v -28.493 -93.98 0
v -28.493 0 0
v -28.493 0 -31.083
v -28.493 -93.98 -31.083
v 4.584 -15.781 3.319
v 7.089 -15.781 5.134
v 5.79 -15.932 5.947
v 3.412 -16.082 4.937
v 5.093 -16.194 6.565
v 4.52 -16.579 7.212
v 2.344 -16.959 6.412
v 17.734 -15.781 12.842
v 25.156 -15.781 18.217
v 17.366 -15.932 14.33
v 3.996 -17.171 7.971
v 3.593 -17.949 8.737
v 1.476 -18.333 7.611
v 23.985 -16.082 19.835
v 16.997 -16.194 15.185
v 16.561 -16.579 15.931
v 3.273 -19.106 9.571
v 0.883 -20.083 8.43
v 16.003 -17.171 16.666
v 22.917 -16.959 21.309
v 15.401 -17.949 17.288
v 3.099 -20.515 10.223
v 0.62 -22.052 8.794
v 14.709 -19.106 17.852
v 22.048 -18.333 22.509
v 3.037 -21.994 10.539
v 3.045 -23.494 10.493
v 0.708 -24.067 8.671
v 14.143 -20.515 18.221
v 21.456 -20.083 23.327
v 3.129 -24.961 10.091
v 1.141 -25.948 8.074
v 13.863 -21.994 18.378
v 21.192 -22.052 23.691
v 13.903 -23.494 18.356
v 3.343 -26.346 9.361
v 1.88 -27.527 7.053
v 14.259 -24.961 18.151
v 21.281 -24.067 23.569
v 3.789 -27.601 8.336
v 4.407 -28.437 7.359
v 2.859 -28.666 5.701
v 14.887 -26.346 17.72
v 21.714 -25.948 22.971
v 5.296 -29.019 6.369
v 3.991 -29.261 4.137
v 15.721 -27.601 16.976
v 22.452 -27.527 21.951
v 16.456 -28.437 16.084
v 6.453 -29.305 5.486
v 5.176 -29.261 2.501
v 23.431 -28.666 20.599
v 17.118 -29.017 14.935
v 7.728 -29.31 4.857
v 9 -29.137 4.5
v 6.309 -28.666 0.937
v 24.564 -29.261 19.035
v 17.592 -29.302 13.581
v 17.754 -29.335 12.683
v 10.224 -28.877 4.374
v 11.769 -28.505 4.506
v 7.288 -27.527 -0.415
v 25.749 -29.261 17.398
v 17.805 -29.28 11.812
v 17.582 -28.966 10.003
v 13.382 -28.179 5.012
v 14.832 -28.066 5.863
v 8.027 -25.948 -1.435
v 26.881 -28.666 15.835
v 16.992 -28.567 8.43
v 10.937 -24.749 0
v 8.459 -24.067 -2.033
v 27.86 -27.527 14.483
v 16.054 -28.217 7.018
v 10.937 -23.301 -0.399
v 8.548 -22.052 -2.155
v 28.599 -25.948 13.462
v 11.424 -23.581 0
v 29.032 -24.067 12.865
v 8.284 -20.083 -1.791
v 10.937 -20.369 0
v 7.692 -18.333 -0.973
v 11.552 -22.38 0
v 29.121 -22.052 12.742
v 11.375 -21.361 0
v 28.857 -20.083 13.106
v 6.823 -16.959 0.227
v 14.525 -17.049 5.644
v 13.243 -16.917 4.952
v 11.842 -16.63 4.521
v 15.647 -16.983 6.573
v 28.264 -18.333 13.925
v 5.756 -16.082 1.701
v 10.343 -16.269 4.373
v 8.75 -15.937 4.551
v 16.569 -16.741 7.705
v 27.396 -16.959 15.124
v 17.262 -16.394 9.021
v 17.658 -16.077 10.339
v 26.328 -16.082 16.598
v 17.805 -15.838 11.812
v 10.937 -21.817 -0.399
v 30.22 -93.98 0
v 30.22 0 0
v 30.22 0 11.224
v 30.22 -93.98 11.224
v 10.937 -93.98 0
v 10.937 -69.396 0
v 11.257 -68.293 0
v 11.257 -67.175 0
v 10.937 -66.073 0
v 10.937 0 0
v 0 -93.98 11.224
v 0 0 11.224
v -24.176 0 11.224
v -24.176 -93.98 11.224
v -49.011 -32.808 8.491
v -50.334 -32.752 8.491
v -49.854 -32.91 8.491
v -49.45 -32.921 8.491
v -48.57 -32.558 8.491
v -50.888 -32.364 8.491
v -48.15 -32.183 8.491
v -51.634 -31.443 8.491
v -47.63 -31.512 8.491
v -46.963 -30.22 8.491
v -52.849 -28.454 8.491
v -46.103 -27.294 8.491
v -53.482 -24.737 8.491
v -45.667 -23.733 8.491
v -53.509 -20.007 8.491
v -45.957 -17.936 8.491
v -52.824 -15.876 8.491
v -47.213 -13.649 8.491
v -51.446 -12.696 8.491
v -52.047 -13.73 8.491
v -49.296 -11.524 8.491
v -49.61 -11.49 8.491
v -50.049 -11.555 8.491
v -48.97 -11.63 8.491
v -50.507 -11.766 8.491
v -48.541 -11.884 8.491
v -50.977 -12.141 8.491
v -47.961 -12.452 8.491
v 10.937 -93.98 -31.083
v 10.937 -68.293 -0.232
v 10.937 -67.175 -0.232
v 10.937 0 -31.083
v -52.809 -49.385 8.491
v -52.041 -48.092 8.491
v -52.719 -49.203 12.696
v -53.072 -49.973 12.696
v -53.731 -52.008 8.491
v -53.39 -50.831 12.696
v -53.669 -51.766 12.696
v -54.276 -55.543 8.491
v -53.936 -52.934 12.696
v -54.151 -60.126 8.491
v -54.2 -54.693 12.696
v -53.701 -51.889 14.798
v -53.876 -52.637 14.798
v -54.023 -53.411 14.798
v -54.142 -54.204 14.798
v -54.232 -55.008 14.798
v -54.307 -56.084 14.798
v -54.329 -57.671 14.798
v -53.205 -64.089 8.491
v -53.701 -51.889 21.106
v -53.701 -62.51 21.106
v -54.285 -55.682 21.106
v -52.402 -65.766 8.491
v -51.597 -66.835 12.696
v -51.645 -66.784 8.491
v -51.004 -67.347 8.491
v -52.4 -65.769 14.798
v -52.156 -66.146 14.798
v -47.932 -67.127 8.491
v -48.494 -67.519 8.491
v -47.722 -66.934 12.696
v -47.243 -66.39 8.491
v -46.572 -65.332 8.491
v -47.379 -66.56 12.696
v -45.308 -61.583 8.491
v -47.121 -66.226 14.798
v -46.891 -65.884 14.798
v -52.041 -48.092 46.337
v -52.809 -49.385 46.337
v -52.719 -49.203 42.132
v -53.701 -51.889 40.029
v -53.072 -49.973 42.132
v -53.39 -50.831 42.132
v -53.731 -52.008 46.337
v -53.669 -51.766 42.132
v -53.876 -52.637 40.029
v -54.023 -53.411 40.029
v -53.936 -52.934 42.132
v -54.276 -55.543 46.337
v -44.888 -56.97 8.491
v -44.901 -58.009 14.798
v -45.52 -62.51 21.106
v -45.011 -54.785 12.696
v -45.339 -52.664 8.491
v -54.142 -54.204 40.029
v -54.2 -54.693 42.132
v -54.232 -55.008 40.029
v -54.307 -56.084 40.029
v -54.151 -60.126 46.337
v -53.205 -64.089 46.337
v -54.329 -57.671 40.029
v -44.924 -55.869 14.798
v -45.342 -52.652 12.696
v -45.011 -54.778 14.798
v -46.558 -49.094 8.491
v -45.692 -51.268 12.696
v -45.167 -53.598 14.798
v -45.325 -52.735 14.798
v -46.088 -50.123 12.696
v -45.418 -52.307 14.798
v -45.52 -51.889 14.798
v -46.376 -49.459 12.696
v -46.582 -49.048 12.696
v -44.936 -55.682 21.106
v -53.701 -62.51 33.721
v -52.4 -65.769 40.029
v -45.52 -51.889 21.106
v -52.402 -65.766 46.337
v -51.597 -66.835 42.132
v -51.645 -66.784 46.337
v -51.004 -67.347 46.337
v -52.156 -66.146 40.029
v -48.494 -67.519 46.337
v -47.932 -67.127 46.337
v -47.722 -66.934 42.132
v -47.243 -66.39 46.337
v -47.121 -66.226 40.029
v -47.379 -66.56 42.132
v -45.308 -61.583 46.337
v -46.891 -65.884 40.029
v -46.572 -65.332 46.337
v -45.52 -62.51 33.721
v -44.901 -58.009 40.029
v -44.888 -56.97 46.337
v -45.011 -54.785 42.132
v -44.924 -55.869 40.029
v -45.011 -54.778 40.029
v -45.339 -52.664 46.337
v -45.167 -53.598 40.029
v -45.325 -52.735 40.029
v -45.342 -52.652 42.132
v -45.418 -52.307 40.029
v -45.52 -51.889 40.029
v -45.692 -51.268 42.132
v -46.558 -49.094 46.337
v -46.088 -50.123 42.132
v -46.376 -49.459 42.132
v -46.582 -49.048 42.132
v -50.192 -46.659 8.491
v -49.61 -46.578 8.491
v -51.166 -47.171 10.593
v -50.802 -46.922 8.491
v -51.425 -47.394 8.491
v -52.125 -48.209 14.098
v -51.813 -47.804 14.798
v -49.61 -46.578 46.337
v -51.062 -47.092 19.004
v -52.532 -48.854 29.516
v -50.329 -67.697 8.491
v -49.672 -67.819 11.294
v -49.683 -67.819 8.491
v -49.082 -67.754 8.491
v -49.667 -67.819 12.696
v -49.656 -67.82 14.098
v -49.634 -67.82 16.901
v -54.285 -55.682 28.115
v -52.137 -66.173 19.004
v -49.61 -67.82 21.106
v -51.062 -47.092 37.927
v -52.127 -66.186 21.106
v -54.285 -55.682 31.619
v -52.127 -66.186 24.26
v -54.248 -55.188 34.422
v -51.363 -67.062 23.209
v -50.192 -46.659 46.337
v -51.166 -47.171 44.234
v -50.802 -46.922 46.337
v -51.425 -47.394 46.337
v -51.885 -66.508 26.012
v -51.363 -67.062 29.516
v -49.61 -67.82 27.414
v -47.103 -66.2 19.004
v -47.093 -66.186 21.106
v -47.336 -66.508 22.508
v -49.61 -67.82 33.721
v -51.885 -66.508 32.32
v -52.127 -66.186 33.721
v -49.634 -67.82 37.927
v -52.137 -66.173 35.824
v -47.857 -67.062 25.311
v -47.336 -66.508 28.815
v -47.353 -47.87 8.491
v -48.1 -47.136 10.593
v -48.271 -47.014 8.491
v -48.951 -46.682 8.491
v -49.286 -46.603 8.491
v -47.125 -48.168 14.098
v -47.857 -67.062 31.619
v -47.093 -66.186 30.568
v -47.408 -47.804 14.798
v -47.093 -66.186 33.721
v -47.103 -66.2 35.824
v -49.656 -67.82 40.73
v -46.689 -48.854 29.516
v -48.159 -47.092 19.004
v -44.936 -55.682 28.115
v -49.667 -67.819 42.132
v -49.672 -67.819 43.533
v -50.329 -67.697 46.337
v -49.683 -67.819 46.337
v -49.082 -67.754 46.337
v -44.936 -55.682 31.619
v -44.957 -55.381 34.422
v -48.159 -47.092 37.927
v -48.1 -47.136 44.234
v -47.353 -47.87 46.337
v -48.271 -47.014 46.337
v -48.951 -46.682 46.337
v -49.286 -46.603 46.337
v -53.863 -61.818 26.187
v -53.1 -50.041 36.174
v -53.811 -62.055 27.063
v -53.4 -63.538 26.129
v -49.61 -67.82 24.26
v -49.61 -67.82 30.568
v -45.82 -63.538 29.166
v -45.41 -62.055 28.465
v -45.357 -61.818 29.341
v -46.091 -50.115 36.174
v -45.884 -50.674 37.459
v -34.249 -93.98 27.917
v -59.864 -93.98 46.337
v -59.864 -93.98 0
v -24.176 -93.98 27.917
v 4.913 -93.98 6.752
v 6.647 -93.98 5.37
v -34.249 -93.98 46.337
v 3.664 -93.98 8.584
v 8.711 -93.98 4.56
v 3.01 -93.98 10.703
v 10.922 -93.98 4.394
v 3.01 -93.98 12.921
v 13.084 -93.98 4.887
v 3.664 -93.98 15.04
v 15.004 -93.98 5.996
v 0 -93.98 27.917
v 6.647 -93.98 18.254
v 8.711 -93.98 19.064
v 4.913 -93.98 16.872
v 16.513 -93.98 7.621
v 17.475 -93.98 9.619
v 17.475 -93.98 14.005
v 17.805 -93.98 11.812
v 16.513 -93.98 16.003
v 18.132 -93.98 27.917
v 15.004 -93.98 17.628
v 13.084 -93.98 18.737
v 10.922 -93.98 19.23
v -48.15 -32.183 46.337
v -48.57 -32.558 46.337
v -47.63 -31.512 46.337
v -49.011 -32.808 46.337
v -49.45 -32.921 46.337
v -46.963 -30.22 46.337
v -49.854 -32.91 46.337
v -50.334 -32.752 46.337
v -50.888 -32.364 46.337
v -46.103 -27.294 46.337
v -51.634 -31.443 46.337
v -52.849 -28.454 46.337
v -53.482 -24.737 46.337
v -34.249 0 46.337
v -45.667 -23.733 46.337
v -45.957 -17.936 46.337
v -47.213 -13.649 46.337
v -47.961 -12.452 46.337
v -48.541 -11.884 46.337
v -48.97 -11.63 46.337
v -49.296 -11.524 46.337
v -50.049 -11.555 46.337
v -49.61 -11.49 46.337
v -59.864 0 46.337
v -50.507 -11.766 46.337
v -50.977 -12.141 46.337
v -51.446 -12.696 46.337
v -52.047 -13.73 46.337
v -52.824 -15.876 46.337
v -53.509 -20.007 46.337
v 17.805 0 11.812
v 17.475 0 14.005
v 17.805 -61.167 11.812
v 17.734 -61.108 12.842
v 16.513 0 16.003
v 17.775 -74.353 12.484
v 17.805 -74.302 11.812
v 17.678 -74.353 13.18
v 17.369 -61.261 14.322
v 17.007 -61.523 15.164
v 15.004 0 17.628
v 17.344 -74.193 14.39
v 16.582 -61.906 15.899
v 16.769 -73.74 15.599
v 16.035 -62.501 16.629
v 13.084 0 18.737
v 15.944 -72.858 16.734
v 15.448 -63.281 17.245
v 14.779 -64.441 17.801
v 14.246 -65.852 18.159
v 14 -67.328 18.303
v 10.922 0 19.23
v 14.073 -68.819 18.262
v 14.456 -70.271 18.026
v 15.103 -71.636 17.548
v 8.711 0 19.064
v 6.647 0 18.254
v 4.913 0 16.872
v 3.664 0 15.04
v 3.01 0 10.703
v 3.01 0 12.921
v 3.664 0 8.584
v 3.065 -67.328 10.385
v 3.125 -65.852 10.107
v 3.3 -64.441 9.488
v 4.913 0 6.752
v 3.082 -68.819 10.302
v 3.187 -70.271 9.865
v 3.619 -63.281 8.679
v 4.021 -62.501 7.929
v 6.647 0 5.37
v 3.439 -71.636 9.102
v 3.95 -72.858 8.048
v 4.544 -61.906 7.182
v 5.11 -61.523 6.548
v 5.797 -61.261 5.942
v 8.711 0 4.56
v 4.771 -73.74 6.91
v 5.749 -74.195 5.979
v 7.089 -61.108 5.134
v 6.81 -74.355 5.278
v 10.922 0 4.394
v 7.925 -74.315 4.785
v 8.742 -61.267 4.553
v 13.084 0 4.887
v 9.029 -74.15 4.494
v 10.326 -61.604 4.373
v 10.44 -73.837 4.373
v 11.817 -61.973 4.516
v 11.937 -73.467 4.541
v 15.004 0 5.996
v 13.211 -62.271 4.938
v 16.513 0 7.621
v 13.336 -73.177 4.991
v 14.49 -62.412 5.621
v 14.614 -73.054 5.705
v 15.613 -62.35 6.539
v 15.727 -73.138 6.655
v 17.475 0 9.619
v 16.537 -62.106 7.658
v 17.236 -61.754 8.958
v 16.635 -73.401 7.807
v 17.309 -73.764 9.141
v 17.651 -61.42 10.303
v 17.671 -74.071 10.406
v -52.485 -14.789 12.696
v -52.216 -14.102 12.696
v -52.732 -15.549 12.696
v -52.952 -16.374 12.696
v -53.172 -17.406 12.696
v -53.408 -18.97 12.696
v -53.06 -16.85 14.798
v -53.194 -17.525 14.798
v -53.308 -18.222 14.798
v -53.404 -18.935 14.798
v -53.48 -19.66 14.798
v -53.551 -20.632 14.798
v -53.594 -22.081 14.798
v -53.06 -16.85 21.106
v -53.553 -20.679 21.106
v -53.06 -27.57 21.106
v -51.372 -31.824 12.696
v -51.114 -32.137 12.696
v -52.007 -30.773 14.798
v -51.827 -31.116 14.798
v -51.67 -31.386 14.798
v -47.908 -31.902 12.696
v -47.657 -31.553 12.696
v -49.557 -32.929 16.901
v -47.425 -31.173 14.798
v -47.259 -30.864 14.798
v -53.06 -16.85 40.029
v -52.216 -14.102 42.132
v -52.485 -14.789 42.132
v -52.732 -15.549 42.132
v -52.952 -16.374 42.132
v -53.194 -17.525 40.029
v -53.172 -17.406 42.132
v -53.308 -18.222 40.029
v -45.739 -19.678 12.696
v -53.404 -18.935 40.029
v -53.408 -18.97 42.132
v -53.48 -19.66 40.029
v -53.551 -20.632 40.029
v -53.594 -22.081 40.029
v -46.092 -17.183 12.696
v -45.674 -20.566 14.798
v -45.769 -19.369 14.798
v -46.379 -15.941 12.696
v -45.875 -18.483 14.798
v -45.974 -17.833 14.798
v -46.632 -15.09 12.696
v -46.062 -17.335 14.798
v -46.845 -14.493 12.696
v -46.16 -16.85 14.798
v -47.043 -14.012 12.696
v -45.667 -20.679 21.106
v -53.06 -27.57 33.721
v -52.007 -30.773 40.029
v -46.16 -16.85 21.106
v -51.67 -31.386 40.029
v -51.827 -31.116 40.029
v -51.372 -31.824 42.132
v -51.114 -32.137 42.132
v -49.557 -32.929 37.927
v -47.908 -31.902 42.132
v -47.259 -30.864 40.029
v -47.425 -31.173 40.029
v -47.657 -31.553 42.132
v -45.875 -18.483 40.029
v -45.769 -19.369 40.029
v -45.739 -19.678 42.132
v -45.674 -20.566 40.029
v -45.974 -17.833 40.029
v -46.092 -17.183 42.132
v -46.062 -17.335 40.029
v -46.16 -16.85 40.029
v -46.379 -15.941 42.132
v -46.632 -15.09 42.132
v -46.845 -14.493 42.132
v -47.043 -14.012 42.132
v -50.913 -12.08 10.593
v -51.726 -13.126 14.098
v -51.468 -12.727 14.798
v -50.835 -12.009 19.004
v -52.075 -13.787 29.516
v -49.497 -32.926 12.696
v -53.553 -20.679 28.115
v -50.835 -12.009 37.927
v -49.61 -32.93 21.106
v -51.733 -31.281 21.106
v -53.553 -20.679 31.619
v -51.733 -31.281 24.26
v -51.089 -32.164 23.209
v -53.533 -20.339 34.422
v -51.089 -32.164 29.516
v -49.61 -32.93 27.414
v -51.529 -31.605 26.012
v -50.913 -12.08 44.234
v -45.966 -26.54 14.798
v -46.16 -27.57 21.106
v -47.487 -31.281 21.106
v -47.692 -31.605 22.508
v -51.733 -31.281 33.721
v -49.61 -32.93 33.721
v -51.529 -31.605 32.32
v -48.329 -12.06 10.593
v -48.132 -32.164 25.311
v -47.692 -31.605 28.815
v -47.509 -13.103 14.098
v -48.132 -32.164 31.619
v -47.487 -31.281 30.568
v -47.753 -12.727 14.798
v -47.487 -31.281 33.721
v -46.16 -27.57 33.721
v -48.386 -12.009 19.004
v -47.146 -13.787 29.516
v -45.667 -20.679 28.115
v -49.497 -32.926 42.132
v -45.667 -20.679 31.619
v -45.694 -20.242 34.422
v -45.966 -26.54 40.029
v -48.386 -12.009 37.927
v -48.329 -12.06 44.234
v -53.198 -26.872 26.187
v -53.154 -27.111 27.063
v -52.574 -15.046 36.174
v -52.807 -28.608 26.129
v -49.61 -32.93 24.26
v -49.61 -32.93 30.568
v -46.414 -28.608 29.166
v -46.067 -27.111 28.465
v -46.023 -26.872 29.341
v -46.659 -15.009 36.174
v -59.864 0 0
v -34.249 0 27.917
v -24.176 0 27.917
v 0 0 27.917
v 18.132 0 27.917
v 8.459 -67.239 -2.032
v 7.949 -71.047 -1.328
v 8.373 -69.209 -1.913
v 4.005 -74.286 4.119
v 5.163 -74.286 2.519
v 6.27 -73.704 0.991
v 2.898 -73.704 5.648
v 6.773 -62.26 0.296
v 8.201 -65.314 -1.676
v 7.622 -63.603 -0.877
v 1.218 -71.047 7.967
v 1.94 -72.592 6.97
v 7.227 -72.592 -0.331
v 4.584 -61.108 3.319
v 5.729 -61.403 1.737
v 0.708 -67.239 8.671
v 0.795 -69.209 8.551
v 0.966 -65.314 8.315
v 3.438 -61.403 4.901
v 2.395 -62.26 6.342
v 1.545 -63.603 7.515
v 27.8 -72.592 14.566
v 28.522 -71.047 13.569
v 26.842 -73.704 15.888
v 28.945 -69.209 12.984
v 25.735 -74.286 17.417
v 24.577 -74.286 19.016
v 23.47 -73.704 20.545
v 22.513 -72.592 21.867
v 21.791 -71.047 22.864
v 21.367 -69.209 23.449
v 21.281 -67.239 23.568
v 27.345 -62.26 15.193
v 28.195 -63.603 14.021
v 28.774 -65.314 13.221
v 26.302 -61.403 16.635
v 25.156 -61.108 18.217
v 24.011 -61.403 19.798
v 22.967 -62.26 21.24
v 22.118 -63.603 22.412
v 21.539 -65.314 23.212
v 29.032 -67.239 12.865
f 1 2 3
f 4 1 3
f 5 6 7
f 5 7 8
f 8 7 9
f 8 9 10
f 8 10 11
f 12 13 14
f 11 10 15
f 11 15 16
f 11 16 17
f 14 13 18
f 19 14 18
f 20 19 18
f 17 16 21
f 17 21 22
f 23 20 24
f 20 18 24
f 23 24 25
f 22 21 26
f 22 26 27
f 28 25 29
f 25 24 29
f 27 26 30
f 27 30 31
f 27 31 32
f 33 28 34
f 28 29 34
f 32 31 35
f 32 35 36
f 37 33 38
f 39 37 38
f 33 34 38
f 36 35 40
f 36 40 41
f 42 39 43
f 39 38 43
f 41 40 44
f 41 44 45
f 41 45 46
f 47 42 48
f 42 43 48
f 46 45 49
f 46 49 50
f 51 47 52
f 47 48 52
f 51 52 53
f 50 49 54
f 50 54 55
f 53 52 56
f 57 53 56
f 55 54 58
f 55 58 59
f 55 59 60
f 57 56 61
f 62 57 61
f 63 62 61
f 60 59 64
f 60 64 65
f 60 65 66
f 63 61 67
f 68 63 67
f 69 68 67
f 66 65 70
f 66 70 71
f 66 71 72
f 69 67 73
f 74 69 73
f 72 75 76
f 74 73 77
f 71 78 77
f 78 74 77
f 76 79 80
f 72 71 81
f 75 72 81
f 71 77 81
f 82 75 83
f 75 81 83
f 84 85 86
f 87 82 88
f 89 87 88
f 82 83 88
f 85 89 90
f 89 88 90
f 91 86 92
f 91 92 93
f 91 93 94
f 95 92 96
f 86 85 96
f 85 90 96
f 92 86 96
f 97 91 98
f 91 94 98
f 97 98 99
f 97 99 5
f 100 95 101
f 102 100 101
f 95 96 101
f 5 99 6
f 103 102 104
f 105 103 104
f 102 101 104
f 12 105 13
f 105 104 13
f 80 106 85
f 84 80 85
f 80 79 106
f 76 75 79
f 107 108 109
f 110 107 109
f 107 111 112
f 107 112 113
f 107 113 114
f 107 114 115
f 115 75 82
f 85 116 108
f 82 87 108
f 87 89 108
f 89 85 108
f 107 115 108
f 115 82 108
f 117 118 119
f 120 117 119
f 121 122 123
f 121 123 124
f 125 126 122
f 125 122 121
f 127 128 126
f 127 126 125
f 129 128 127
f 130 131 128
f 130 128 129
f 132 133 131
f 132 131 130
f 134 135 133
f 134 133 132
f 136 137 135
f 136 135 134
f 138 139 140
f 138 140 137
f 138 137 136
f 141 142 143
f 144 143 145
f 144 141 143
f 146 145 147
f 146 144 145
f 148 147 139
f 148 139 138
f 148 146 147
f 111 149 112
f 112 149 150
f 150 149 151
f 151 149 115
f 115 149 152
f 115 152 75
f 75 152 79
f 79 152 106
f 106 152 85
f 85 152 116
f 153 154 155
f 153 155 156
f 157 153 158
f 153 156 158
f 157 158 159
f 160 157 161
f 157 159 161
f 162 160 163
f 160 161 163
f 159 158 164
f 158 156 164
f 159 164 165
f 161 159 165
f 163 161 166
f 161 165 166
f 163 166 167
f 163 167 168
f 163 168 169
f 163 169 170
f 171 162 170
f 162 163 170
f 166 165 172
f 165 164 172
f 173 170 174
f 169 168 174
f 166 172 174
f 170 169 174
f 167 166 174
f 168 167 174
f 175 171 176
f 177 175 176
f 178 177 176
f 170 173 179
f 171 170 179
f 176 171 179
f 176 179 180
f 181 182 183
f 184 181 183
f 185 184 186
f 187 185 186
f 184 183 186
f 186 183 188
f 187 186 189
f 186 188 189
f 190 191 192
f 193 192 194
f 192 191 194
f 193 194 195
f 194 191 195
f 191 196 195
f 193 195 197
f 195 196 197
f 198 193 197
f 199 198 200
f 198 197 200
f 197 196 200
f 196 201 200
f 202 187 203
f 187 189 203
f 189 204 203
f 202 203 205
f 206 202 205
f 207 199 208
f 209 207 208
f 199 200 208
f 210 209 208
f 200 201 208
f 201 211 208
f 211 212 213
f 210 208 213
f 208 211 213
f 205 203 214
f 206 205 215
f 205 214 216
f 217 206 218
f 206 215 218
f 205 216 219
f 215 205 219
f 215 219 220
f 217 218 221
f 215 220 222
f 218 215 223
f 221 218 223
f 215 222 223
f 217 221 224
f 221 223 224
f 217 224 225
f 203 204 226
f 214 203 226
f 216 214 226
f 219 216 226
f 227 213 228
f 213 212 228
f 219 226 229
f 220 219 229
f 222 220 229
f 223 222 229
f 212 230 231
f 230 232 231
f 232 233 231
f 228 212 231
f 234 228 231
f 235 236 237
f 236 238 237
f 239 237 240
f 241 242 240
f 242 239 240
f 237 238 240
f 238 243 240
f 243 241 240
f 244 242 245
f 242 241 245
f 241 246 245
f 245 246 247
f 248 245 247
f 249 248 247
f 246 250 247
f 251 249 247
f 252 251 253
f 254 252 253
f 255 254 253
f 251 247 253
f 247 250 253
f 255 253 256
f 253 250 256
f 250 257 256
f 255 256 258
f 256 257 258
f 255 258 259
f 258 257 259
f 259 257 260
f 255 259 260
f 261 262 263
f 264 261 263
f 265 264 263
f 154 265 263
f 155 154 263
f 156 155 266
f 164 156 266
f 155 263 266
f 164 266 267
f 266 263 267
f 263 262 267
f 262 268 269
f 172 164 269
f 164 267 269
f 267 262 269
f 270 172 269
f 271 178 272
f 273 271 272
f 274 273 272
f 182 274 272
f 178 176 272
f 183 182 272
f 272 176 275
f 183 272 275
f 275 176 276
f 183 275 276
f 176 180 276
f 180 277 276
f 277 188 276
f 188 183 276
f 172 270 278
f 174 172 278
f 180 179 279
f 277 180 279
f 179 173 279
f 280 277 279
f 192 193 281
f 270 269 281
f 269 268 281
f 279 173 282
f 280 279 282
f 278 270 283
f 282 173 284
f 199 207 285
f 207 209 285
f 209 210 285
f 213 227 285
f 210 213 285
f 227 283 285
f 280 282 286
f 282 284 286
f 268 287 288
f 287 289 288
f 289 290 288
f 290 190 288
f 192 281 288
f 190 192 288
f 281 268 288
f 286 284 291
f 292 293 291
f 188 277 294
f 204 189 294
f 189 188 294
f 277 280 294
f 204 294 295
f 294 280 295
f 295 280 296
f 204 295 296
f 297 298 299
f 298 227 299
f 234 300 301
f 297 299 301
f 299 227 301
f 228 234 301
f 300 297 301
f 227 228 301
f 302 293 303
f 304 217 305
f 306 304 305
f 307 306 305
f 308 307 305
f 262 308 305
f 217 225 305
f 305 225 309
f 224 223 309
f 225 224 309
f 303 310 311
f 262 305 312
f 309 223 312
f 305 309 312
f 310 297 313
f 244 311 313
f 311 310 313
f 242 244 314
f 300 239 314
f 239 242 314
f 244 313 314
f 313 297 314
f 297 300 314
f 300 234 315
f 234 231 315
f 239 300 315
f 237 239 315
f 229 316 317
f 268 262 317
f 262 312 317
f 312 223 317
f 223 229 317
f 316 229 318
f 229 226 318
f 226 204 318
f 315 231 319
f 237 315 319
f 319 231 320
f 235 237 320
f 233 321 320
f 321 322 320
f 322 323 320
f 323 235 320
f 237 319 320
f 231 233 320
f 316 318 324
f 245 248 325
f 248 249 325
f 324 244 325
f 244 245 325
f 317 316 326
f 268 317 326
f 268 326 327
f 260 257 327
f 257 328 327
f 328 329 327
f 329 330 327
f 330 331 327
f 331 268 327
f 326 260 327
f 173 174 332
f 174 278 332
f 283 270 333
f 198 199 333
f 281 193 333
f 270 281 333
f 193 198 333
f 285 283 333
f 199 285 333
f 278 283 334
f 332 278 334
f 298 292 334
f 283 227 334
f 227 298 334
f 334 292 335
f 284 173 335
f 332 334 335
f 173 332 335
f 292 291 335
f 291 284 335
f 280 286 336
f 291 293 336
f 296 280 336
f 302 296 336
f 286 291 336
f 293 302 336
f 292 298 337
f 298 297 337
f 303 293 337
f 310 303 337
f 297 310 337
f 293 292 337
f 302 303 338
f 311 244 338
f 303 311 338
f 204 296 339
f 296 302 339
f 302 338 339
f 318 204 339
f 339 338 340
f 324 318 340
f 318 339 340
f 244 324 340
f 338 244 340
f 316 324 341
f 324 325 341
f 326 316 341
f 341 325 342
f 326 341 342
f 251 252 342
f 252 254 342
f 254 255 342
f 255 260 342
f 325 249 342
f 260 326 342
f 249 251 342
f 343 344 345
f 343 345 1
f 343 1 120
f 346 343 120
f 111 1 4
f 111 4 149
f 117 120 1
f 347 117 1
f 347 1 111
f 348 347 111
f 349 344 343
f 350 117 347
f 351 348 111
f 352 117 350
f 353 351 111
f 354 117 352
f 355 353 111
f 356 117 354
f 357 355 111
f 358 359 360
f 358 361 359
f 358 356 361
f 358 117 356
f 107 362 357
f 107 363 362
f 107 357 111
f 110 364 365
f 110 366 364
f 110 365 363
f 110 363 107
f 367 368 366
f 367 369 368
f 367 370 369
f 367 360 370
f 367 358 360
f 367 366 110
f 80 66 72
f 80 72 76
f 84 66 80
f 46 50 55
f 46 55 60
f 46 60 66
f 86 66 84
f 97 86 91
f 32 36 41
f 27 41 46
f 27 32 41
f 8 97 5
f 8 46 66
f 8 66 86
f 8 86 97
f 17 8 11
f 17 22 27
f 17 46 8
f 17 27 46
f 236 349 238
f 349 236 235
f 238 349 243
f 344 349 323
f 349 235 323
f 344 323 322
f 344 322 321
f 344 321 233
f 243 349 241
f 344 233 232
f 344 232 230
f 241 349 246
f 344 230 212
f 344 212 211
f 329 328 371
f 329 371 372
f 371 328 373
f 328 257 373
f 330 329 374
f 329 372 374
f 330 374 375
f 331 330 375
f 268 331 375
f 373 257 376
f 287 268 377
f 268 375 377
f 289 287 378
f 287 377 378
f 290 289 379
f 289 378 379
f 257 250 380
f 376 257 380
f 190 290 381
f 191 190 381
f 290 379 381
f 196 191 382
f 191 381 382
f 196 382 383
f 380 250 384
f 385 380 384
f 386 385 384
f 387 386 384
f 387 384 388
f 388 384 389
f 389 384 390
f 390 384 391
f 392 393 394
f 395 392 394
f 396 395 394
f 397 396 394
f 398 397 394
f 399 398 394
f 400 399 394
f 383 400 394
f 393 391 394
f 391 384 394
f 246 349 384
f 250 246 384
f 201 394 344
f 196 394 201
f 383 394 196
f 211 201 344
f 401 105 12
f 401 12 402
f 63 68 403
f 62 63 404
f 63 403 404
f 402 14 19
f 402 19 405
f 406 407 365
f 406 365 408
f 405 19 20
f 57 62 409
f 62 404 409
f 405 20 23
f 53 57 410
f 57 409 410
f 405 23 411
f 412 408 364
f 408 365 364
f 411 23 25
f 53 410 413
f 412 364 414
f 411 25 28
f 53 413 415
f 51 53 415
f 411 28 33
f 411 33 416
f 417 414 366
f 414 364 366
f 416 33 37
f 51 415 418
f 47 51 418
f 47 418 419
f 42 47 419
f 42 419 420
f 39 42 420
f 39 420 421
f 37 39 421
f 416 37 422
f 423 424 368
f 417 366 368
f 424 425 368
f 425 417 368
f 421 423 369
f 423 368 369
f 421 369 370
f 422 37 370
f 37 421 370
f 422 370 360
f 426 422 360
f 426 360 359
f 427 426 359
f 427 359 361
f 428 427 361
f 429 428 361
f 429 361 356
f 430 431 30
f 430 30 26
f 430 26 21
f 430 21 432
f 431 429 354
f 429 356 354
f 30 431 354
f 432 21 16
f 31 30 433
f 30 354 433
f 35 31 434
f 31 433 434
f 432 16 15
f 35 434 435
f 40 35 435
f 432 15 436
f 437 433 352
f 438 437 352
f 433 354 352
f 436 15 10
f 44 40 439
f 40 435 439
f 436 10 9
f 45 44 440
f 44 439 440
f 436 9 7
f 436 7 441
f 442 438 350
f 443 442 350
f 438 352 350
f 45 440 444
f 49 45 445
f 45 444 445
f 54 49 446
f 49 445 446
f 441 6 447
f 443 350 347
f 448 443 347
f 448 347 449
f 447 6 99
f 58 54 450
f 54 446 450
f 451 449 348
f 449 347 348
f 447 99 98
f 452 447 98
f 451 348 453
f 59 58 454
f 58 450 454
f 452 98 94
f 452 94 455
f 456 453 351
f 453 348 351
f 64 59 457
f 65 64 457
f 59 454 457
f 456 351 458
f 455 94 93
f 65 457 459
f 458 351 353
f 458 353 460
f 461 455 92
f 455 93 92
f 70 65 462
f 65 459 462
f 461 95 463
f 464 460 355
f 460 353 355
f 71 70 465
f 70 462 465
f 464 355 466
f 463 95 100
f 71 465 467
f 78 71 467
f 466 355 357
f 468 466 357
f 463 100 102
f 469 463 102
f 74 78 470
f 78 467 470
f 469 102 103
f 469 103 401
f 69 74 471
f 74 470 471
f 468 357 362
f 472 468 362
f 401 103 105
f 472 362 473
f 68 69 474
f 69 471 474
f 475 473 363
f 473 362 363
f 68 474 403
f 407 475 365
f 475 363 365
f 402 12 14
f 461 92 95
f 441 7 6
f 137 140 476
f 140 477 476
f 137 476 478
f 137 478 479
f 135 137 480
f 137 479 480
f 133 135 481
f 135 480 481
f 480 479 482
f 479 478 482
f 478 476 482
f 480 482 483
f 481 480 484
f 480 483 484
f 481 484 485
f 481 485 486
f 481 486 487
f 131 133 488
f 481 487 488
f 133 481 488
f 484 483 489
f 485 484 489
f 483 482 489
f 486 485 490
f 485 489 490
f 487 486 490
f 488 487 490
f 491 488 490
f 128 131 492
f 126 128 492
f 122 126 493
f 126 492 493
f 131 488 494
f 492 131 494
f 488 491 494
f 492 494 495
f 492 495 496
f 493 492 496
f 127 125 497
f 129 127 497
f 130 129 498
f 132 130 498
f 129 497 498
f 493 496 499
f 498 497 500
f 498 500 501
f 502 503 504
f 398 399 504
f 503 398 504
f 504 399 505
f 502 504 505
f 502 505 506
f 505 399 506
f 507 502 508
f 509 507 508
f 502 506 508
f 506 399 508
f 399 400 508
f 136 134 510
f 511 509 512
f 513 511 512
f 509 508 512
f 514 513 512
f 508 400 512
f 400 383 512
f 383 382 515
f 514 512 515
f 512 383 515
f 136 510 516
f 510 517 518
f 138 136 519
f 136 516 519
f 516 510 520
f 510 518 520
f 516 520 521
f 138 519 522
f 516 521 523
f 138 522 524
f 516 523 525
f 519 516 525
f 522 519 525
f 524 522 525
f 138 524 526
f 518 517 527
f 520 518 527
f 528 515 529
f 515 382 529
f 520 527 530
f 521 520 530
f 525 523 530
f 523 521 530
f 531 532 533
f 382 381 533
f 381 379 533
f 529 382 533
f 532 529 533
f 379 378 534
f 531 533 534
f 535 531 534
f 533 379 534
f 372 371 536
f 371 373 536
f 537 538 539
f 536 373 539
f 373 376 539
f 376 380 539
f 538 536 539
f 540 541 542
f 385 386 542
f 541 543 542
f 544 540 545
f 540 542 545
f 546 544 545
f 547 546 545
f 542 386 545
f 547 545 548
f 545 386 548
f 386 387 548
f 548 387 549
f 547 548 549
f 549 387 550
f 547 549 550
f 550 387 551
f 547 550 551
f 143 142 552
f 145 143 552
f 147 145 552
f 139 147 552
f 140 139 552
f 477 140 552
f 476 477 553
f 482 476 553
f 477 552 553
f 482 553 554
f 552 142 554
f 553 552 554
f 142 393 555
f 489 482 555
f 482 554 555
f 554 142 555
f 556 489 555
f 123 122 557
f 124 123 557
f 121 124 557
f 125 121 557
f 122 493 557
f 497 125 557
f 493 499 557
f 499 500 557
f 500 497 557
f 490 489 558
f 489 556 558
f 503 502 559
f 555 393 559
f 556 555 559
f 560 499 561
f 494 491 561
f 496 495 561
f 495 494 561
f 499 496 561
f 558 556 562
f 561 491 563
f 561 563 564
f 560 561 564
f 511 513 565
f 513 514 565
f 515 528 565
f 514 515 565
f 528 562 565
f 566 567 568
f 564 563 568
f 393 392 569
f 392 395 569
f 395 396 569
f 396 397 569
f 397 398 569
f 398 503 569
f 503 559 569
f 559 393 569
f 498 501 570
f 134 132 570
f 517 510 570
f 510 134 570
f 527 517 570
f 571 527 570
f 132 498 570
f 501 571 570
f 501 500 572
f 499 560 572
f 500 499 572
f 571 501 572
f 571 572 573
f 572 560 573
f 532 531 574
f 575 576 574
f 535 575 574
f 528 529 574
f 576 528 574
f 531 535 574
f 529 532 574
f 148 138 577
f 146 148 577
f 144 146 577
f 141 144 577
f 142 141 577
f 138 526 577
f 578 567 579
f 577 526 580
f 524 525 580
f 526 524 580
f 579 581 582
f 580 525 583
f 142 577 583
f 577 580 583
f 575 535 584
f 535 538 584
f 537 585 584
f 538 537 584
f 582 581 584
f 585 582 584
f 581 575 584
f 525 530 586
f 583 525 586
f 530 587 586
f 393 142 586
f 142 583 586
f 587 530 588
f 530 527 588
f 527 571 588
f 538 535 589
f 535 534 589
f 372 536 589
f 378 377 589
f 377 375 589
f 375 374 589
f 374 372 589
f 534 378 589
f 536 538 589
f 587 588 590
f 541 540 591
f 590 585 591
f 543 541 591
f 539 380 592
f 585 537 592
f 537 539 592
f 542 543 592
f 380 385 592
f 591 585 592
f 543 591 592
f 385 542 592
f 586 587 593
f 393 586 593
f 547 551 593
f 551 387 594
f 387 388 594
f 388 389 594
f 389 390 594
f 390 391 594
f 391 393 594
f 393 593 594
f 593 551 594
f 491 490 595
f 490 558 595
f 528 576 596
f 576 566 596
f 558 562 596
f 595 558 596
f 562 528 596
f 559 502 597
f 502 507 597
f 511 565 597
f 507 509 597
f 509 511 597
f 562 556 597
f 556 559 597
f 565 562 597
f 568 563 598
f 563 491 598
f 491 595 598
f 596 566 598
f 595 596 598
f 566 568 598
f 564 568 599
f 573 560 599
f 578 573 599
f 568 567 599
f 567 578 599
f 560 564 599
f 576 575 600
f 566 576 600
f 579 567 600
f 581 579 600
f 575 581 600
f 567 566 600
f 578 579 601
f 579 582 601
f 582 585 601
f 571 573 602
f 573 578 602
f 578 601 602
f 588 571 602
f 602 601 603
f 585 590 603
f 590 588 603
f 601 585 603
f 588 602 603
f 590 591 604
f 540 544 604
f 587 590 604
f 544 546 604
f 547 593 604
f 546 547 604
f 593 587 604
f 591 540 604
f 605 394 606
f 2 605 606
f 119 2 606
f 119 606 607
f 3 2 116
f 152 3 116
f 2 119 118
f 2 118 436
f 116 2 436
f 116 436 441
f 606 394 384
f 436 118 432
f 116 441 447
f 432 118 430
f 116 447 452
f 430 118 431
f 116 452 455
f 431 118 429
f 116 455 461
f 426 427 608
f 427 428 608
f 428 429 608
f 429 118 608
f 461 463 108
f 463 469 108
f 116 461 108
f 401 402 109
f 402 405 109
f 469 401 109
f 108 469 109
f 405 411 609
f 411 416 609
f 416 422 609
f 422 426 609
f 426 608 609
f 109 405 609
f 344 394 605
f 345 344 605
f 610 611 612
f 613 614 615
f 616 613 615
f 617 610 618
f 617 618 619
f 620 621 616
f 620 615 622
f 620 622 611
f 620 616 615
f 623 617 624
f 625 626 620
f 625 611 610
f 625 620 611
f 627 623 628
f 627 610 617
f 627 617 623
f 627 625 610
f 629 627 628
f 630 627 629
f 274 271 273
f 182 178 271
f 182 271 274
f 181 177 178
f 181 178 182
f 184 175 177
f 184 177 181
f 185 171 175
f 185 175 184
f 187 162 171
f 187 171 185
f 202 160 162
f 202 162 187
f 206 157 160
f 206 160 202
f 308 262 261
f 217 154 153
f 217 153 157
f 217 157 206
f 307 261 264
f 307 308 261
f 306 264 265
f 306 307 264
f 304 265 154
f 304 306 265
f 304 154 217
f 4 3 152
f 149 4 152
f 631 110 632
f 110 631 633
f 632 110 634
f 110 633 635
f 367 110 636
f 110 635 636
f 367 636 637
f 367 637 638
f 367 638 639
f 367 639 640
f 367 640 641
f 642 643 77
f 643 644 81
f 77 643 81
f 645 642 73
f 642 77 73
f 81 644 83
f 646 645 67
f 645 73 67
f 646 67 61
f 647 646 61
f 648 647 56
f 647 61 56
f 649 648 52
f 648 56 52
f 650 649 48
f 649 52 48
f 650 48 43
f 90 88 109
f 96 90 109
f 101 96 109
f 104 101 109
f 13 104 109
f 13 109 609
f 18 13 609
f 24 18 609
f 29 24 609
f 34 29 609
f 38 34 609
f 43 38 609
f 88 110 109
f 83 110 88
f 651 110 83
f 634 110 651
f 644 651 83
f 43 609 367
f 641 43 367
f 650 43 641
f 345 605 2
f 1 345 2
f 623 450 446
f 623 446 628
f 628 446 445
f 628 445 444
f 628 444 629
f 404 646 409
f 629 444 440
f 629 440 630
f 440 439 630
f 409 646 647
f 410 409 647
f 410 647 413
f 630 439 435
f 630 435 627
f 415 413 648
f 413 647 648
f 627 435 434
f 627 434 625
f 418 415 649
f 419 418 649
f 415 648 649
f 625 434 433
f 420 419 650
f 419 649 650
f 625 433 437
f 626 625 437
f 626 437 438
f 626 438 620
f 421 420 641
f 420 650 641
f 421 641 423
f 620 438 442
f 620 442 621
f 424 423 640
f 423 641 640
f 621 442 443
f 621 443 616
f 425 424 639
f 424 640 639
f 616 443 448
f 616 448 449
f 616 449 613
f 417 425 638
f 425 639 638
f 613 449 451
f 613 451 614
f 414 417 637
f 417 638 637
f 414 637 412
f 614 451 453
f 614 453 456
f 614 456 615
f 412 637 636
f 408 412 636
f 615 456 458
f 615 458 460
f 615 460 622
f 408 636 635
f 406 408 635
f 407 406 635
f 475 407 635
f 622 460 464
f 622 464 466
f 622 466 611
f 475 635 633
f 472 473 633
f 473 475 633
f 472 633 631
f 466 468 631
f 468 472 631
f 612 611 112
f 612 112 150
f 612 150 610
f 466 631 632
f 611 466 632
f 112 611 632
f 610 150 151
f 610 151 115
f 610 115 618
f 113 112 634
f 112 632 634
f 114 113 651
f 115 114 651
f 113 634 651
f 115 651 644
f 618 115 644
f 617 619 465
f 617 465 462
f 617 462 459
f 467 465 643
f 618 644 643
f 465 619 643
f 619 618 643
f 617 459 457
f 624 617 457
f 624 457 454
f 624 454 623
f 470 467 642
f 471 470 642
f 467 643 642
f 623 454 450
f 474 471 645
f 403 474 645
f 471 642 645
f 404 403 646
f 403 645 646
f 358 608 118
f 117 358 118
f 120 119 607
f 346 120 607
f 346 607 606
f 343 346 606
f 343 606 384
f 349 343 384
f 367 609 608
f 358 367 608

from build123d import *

# Parameters (mm, degrees)
F1_DEPTH = 93.98
F2_R     = 6.626037
F2_R_2   = 6.777955
F3_DEPTH = 25.4
F5_DEPTH = 37.846
F6_R     = 7.438968
F7_DEPTH = 128.778


with BuildPart() as f1:
    # F0 (on Front) → F1 (new body)
    with BuildSketch(Plane.XZ):
        Polygon((-34.248885, 46.336725), (-59.863597, 46.336725), (-59.863597, 0), (-28.492769, 0), (-28.492769, -31.083023), (10.93662, -31.083023), (10.93662, 0), (30.219607, 0), (30.219607, 11.224424), (18.131761, 27.917158), (0, 27.917158), (0, 11.224424), (-24.175683, 11.224424), (-24.175683, 27.917158), (-34.248885, 27.917158), align=None)
    extrude(amount=F1_DEPTH)

    # F2 (on face) → F3 (cut)
    with BuildSketch(Plane(origin=(25.156285, 0, 18.216628), x_dir=(0, 1, 0), z_dir=(0.809942, 0, 0.58651))):
        with Locations((-67.734443, 0)):
            Circle(F2_R)
        with Locations((-22.558866, 0)):
            Circle(F2_R_2)
    extrude(amount=-F3_DEPTH, mode=Mode.SUBTRACT)

    # F4 (on face) → F5 (cut)
    with BuildSketch(Plane.XY.offset(46.336725)):
        with BuildLine():
            add(Edge.make_bspline(
                [(-49.610309, -46.578269), (-57.791175, -46.578269), (-53.700742, -62.50973), (-49.610309, -78.441191), (-45.519876, -62.50973), (-41.429444, -46.578269), (-49.610309, -46.578269)],
                knots=[0, 0, 0, 2.094395, 2.094395, 4.18879, 4.18879, 6.283185, 6.283185, 6.283185], degree=2, weights=[1, 0.5, 1, 0.5, 1, 0.5, 1]))
        make_face()
        with BuildLine():
            add(Edge.make_bspline(
                [(-49.610309, -11.490341), (-56.510654, -11.490341), (-53.060482, -27.570017), (-49.610309, -43.649692), (-46.160137, -27.570017), (-42.709965, -11.490341), (-49.610309, -11.490341)],
                knots=[0, 0, 0, 2.094395, 2.094395, 4.18879, 4.18879, 6.283185, 6.283185, 6.283185], degree=2, weights=[1, 0.5, 1, 0.5, 1, 0.5, 1]))
        make_face()
    extrude(amount=-F5_DEPTH, mode=Mode.SUBTRACT)

    # F6 (on face) → F7 (cut)
    with BuildSketch(Plane.XZ.offset(93.98)):
        with Locations((10.366299, 11.81201)):
            Circle(F6_R)
    extrude(amount=-F7_DEPTH, mode=Mode.SUBTRACT)


solid = f1.part
